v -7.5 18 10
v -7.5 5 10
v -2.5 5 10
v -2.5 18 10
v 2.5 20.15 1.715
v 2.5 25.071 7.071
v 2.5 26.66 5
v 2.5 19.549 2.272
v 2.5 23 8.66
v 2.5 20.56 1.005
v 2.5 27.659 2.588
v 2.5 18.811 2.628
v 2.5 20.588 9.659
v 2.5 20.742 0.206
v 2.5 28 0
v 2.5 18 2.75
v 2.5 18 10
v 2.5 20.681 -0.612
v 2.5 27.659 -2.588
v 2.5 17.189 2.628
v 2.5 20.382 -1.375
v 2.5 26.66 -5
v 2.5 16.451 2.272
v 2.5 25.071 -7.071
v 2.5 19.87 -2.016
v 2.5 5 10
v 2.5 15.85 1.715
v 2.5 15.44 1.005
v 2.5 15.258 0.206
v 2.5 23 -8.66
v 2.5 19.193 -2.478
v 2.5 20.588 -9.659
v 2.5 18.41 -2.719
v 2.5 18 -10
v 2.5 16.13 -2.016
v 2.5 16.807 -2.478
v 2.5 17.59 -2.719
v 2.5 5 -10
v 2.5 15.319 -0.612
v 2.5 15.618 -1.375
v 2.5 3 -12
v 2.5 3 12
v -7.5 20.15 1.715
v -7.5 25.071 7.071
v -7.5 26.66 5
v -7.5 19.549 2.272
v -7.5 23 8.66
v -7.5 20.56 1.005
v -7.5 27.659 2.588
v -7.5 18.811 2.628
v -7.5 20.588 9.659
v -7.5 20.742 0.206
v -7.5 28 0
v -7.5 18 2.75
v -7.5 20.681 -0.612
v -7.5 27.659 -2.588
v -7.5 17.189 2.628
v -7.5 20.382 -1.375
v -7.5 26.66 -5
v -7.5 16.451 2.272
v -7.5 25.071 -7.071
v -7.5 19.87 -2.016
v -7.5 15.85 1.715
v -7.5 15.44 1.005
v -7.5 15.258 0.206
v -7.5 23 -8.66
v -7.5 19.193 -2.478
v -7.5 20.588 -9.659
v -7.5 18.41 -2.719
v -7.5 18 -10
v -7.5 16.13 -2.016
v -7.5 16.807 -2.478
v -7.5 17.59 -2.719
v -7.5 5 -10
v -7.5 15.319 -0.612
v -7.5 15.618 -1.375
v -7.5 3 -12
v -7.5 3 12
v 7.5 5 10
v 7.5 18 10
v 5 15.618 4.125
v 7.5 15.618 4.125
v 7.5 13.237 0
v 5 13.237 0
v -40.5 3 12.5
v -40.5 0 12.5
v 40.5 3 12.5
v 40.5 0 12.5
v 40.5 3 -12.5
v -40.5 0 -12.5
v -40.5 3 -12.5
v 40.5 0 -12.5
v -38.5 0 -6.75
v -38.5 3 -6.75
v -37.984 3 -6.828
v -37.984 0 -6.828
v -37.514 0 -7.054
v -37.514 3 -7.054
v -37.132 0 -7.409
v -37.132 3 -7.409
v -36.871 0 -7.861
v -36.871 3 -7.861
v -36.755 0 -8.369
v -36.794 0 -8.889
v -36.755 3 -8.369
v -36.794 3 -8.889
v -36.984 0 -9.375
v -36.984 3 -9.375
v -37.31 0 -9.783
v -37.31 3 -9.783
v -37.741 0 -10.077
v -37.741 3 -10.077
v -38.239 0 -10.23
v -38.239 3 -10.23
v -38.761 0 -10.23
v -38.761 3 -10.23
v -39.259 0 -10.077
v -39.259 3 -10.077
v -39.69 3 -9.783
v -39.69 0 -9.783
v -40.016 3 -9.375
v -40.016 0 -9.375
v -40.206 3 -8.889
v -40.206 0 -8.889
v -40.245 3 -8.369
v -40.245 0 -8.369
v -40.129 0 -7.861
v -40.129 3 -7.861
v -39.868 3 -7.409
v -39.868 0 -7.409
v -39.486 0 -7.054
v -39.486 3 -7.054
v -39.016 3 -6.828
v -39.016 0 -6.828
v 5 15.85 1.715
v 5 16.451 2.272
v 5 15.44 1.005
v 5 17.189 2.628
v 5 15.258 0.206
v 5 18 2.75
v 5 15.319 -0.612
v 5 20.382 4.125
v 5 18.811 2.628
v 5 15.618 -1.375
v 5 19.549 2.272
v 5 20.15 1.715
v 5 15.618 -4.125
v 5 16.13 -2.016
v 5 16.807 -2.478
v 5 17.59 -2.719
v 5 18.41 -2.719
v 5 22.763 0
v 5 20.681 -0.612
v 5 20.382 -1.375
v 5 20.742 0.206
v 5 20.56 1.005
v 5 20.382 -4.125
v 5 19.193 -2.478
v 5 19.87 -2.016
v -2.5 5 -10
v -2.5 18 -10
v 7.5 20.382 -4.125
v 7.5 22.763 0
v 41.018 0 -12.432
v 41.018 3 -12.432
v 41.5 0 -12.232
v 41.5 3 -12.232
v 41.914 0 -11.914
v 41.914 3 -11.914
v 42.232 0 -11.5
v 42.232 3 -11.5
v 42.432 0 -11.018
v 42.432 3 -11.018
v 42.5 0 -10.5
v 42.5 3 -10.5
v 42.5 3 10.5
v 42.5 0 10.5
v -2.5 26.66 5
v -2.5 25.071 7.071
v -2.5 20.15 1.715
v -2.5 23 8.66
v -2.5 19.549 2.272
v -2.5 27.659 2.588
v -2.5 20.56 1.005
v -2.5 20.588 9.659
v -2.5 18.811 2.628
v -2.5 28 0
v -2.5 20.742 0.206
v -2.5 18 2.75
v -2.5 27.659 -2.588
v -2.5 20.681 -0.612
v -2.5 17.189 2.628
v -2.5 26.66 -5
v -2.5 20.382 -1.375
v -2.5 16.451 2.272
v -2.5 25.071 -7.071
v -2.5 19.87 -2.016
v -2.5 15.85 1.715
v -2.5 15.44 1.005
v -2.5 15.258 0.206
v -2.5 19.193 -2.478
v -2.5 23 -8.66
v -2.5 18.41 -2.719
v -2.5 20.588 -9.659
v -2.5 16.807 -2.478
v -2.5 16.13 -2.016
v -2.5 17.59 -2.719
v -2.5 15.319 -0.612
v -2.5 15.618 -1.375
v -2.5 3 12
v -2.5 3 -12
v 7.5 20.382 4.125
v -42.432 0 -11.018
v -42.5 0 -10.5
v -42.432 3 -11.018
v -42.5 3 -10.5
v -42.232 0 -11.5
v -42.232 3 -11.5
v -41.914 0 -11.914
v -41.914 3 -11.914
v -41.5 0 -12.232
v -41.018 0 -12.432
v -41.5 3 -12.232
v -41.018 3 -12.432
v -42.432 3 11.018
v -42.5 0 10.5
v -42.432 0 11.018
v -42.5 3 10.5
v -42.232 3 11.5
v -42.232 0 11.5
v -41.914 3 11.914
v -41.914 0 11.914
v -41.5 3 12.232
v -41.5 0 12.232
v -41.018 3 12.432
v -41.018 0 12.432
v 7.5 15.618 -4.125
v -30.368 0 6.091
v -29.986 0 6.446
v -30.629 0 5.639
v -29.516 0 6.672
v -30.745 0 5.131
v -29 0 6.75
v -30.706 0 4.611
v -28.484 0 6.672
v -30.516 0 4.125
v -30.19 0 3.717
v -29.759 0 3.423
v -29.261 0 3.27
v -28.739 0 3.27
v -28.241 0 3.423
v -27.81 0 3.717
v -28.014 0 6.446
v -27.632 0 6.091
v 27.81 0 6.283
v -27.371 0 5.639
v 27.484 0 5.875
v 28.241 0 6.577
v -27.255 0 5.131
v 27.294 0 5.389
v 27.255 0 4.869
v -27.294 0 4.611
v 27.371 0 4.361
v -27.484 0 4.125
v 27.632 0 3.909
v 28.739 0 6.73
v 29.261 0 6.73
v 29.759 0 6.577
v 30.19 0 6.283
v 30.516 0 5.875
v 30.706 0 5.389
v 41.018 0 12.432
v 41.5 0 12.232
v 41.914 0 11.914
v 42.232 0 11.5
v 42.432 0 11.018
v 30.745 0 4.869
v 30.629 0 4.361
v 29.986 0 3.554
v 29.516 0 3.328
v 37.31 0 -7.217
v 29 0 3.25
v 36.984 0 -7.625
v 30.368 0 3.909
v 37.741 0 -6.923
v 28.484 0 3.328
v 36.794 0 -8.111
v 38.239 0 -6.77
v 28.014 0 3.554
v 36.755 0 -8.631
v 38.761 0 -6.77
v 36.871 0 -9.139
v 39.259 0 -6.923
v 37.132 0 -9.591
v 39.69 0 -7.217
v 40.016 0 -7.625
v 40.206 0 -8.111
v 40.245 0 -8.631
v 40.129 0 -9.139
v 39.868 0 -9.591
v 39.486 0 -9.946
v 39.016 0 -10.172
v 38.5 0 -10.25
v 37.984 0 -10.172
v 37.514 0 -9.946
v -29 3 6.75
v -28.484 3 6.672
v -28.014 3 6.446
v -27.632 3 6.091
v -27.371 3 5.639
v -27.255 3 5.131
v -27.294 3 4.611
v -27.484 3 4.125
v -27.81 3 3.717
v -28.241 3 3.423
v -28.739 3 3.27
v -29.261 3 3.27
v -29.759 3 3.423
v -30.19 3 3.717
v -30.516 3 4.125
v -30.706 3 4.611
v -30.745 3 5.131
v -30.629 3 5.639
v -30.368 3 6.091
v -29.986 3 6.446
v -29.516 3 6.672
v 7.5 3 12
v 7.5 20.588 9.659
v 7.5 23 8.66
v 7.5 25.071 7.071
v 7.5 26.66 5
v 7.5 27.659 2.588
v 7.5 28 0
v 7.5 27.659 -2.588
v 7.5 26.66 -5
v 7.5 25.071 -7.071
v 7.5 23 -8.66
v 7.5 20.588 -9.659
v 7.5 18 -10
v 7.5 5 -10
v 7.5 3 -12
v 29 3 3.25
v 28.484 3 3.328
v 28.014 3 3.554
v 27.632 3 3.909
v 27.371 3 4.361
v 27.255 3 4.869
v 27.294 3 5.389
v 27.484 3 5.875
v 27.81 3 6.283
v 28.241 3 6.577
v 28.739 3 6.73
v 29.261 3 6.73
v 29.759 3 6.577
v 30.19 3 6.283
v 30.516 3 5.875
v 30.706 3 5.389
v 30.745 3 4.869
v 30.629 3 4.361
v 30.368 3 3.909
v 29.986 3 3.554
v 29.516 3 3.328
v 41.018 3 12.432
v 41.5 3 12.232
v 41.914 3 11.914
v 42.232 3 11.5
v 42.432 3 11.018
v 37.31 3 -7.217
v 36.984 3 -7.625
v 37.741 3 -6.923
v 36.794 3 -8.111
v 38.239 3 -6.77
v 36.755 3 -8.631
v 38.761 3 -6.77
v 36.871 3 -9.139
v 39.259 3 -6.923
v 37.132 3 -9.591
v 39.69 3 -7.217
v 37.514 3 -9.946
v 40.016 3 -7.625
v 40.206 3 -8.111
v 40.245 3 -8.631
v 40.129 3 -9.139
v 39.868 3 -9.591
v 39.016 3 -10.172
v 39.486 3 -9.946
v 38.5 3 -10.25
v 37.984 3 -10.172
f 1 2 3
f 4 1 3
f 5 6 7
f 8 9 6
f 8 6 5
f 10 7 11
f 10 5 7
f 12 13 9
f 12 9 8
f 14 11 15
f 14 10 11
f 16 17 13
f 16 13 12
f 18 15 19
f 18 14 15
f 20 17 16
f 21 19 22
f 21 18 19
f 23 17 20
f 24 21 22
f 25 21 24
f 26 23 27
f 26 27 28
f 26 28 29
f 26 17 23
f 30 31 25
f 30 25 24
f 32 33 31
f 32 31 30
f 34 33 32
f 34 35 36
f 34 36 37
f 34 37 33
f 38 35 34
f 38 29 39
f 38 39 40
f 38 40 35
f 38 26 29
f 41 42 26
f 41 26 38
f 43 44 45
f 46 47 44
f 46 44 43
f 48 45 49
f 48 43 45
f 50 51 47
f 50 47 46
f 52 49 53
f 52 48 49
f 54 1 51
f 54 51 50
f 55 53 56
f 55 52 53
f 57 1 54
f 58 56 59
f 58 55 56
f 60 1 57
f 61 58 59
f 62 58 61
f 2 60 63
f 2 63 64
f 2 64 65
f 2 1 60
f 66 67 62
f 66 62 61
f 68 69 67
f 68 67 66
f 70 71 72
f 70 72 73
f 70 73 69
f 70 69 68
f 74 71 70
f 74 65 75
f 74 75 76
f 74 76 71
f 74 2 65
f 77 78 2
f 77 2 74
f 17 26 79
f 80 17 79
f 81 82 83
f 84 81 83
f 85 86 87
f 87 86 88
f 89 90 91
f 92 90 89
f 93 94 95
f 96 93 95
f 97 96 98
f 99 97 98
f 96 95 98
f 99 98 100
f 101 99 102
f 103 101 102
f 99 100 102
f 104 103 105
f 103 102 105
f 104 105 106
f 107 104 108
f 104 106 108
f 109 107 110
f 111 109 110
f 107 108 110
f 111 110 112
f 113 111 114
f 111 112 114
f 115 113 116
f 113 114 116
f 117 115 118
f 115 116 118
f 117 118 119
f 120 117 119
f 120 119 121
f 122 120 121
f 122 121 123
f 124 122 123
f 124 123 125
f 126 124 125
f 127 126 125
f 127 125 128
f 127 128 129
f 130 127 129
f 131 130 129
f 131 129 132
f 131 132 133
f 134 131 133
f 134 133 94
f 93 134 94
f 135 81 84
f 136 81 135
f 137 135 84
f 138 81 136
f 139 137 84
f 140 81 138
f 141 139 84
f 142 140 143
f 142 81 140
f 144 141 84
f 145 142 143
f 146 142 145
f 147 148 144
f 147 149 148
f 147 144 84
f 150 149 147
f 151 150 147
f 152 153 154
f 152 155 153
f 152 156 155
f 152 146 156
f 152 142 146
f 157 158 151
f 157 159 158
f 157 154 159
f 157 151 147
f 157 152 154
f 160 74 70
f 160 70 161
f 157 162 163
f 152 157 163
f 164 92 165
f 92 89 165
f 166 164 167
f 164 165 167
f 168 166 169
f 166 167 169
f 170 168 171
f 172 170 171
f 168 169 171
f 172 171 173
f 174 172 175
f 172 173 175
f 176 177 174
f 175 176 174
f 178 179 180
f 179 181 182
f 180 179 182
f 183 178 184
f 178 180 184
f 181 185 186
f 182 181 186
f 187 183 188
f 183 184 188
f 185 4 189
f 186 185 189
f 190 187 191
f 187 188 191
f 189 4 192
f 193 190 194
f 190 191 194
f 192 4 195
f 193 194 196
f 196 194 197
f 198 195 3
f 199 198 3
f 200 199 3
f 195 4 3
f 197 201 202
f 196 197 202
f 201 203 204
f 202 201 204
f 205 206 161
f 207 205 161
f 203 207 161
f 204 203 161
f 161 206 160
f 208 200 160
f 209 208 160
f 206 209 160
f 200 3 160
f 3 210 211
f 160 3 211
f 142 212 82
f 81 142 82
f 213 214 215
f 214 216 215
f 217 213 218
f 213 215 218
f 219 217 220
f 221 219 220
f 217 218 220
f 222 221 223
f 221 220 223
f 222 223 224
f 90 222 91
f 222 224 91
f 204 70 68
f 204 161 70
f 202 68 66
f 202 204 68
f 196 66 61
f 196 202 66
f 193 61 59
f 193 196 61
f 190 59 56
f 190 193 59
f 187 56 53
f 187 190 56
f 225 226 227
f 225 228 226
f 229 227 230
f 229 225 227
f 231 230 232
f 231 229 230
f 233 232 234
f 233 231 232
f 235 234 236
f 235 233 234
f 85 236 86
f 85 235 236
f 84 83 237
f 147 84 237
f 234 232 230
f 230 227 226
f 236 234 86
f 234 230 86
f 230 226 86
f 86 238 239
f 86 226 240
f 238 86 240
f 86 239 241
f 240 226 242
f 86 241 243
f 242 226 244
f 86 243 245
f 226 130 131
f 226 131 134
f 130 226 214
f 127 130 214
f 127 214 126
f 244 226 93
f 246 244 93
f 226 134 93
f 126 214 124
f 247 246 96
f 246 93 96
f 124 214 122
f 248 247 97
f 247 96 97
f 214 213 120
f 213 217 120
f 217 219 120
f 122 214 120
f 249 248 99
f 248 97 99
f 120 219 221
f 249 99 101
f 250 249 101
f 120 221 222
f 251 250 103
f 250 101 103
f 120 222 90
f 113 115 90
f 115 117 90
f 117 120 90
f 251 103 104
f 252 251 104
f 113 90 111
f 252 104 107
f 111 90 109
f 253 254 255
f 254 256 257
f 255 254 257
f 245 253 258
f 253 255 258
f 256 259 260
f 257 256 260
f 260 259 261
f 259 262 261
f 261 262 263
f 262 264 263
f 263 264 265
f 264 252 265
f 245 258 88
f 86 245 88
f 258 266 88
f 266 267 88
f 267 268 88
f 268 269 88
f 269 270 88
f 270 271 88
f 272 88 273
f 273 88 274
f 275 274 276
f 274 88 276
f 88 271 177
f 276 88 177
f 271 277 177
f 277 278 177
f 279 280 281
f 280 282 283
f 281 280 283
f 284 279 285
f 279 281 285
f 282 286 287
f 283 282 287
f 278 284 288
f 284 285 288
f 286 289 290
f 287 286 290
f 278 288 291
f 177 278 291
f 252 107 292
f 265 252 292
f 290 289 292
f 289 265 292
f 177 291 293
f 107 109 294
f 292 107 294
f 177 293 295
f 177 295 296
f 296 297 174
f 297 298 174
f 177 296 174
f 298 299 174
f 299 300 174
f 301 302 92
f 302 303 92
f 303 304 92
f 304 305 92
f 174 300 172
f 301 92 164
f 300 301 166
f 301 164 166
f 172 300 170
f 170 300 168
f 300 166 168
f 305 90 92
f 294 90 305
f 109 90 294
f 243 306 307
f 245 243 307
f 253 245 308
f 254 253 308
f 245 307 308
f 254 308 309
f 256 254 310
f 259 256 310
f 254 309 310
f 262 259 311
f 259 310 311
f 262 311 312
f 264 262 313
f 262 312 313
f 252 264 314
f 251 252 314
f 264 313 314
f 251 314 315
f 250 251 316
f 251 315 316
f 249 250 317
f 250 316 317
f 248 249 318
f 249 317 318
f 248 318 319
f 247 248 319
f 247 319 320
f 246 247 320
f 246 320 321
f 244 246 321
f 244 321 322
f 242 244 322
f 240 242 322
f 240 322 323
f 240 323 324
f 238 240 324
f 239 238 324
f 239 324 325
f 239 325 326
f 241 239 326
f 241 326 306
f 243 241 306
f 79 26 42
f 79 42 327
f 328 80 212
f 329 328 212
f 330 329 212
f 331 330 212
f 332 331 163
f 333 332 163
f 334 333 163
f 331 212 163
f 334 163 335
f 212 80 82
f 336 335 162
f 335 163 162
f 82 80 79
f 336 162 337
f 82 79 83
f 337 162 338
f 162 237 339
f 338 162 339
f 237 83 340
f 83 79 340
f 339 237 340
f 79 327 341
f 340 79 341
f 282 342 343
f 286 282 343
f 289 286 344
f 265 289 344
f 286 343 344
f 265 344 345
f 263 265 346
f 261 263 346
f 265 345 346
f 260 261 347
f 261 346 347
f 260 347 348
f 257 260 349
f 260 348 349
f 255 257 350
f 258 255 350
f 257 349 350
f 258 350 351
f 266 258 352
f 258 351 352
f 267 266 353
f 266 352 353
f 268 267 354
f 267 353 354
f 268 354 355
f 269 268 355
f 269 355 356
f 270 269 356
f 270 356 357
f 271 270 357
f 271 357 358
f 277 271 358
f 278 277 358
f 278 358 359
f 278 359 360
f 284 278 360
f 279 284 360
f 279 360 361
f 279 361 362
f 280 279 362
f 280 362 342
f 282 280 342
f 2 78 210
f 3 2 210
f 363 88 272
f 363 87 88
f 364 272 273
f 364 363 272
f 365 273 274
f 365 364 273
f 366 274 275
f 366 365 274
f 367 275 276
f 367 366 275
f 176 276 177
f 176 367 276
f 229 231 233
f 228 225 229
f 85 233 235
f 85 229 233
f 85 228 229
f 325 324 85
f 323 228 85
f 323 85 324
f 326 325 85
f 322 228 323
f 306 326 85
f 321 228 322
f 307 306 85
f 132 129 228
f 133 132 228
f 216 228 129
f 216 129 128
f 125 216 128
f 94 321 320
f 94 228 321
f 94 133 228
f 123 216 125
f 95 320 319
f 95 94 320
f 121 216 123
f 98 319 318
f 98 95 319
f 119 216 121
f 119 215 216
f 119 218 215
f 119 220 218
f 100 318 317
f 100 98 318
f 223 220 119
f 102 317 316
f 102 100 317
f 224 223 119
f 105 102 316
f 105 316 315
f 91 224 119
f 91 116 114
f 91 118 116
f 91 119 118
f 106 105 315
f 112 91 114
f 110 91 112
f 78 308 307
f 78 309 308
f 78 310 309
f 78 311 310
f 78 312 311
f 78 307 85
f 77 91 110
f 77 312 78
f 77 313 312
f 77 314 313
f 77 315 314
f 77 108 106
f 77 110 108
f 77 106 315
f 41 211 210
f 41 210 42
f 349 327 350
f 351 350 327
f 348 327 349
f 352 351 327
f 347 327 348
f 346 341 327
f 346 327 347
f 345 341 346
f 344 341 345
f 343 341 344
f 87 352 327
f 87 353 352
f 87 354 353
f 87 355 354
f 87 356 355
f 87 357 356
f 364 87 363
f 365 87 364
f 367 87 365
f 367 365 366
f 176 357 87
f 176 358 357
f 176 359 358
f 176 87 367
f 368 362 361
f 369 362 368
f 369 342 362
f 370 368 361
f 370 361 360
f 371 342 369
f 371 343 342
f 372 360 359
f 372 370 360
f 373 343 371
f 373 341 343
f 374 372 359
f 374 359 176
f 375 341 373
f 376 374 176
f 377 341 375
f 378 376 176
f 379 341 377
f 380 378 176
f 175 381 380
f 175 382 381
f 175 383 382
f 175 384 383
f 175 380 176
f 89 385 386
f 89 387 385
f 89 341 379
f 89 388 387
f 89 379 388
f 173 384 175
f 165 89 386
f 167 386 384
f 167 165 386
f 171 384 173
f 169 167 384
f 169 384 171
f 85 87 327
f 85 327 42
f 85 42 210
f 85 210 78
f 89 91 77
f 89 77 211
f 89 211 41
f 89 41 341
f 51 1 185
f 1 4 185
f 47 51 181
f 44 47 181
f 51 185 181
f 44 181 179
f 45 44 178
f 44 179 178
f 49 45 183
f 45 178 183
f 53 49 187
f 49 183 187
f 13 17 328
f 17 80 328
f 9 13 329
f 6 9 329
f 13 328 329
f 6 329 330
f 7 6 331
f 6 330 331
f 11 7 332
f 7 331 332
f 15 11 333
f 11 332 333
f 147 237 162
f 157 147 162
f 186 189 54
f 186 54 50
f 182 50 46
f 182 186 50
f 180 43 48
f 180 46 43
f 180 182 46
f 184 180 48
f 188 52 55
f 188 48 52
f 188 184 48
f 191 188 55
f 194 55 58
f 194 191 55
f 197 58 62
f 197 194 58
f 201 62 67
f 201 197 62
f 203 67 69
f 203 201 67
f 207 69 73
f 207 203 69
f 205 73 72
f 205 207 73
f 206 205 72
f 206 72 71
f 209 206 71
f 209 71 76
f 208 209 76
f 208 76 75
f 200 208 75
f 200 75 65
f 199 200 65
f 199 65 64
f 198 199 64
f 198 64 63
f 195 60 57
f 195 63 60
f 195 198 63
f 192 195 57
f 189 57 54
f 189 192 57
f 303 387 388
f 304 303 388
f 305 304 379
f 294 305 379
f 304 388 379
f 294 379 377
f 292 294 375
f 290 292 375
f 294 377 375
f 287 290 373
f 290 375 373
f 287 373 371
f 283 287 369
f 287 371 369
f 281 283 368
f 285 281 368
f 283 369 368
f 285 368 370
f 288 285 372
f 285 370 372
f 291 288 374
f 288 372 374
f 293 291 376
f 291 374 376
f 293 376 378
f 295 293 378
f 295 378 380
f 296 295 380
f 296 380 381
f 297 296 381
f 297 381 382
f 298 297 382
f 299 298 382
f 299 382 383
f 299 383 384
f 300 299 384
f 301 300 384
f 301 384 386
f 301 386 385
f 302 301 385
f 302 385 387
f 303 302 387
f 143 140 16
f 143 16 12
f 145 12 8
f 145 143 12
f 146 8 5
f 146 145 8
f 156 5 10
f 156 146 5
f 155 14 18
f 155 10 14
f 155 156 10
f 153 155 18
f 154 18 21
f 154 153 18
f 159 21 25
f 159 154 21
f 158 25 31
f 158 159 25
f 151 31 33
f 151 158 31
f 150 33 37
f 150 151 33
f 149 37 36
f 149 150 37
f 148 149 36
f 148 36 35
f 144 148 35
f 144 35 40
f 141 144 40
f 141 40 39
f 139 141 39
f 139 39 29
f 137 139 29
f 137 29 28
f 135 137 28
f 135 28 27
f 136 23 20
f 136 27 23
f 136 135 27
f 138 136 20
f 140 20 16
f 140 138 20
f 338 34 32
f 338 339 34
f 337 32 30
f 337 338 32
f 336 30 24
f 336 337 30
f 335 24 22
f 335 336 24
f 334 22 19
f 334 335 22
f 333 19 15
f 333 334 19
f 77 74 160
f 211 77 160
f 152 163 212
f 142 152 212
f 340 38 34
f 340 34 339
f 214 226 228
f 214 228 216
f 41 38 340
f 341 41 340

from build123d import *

# Parameters (mm, degrees)
SKETCH1_W               = 85
SKETCH1_H               = 25
BOSS_EXTRUDE1_DEPTH     = 3
SKETCH3_R               = 1.75
CUT_EXTRUDE2_DEPTH      = 45.401576549
FILLET2_R               = 2
SKETCH4_W               = 5
SKETCH4_H               = 20
BOSS_EXTRUDE2_DEPTH     = 25
FILLET3_R               = 10
CUT_EXTRUDE3_DEPTH      = 59.653644388
CUT_EXTRUDE3_DEPTH_BACK = 59.653644388
SKETCH5_R               = 2.75
CUT_EXTRUDE4_DEPTH      = 2.5
CHAMFER1_SIZE           = 2


with BuildPart() as part:
    # Sketch1 → Boss-Extrude1 (new body)
    with BuildSketch(Plane(origin=(0, 0, 0), x_dir=(1, 0, 0), z_dir=(0, 1, 0))):
        Rectangle(SKETCH1_W, SKETCH1_H)
    extrude(amount=BOSS_EXTRUDE1_DEPTH)

    # Sketch3 → Cut-Extrude2 (cut, through all)
    with BuildSketch(Plane(origin=(0, 3, 0), x_dir=(1, 0, 0), z_dir=(0, 1, 0))):
        with Locations(Location((-38.5, 8.5, 0), (0, 0, 270))):
            Circle(SKETCH3_R)
        with Locations(Location((38.5, 8.5, 0), (0, 0, 90))):
            Circle(SKETCH3_R)
        with Locations(Location((-29, -5, 0), (0, 0, 270))):
            Circle(SKETCH3_R)
        with Locations(Location((29, -5, 0), (0, 0, 90))):
            Circle(SKETCH3_R)
    extrude(amount=-CUT_EXTRUDE2_DEPTH, mode=Mode.SUBTRACT)

    # Fillet2
    fillet2_edges = [part.edges().sort_by_distance(p)[0] for p in [
        (-42.5, 1.5, -12.5),
        (42.5, 1.5, -12.5),
        (42.5, 1.5, 12.5),
        (-42.5, 1.5, 12.5),
    ]]
    fillet(fillet2_edges, radius=FILLET2_R)

    # Sketch4 → Boss-Extrude2 (add)
    with BuildSketch(Plane(origin=(0, 3, 0), x_dir=(1, 0, 0), z_dir=(0, 1, 0))):
        with Locations((-5, 0)):
            Rectangle(SKETCH4_W, SKETCH4_H)
        with Locations((5, 0)):
            Rectangle(SKETCH4_W, SKETCH4_H)
    extrude(amount=BOSS_EXTRUDE2_DEPTH)

    # Fillet3
    fillet3_edges = [part.edges().sort_by_distance(p)[0] for p in [
        (5, 28, 10),
        (5, 28, -10),
        (-5, 28, -10),
        (-5, 28, 10),
    ]]
    fillet(fillet3_edges, radius=FILLET3_R - 0.0001)  # a hair under: the kernel refuses the full size

    # Sketch5 → Cut-Extrude3 (cut, two sides: drawn at the far end of the back side and taken through both)
    with BuildSketch(Plane.ZY.offset(7.5).offset(-CUT_EXTRUDE3_DEPTH_BACK)):
        with Locations((0, 18)):
            Circle(SKETCH5_R)
    extrude(amount=CUT_EXTRUDE3_DEPTH + CUT_EXTRUDE3_DEPTH_BACK, mode=Mode.SUBTRACT)

    # Sketch6 → Cut-Extrude4 (cut)
    with BuildSketch(Plane(origin=(7.5, 0, 0), x_dir=(0, 0, -1), z_dir=(1, 0, 0))):
        Polygon((0, 13.236860279), (4.125, 15.61843014), (4.125, 20.38156986), (0, 22.763139721), (-4.125, 20.38156986), (-4.125, 15.61843014), align=None)
    extrude(amount=-CUT_EXTRUDE4_DEPTH, mode=Mode.SUBTRACT)

    # Chamfer1
    chamfer1_edges = [part.edges().sort_by_distance(p)[0] for p in [
        (-5, 3, -10),
        (-5, 3, 10),
        (5, 3, -10),
        (5, 3, 10),
    ]]
    chamfer(chamfer1_edges, length=CHAMFER1_SIZE)


solid = part.part
